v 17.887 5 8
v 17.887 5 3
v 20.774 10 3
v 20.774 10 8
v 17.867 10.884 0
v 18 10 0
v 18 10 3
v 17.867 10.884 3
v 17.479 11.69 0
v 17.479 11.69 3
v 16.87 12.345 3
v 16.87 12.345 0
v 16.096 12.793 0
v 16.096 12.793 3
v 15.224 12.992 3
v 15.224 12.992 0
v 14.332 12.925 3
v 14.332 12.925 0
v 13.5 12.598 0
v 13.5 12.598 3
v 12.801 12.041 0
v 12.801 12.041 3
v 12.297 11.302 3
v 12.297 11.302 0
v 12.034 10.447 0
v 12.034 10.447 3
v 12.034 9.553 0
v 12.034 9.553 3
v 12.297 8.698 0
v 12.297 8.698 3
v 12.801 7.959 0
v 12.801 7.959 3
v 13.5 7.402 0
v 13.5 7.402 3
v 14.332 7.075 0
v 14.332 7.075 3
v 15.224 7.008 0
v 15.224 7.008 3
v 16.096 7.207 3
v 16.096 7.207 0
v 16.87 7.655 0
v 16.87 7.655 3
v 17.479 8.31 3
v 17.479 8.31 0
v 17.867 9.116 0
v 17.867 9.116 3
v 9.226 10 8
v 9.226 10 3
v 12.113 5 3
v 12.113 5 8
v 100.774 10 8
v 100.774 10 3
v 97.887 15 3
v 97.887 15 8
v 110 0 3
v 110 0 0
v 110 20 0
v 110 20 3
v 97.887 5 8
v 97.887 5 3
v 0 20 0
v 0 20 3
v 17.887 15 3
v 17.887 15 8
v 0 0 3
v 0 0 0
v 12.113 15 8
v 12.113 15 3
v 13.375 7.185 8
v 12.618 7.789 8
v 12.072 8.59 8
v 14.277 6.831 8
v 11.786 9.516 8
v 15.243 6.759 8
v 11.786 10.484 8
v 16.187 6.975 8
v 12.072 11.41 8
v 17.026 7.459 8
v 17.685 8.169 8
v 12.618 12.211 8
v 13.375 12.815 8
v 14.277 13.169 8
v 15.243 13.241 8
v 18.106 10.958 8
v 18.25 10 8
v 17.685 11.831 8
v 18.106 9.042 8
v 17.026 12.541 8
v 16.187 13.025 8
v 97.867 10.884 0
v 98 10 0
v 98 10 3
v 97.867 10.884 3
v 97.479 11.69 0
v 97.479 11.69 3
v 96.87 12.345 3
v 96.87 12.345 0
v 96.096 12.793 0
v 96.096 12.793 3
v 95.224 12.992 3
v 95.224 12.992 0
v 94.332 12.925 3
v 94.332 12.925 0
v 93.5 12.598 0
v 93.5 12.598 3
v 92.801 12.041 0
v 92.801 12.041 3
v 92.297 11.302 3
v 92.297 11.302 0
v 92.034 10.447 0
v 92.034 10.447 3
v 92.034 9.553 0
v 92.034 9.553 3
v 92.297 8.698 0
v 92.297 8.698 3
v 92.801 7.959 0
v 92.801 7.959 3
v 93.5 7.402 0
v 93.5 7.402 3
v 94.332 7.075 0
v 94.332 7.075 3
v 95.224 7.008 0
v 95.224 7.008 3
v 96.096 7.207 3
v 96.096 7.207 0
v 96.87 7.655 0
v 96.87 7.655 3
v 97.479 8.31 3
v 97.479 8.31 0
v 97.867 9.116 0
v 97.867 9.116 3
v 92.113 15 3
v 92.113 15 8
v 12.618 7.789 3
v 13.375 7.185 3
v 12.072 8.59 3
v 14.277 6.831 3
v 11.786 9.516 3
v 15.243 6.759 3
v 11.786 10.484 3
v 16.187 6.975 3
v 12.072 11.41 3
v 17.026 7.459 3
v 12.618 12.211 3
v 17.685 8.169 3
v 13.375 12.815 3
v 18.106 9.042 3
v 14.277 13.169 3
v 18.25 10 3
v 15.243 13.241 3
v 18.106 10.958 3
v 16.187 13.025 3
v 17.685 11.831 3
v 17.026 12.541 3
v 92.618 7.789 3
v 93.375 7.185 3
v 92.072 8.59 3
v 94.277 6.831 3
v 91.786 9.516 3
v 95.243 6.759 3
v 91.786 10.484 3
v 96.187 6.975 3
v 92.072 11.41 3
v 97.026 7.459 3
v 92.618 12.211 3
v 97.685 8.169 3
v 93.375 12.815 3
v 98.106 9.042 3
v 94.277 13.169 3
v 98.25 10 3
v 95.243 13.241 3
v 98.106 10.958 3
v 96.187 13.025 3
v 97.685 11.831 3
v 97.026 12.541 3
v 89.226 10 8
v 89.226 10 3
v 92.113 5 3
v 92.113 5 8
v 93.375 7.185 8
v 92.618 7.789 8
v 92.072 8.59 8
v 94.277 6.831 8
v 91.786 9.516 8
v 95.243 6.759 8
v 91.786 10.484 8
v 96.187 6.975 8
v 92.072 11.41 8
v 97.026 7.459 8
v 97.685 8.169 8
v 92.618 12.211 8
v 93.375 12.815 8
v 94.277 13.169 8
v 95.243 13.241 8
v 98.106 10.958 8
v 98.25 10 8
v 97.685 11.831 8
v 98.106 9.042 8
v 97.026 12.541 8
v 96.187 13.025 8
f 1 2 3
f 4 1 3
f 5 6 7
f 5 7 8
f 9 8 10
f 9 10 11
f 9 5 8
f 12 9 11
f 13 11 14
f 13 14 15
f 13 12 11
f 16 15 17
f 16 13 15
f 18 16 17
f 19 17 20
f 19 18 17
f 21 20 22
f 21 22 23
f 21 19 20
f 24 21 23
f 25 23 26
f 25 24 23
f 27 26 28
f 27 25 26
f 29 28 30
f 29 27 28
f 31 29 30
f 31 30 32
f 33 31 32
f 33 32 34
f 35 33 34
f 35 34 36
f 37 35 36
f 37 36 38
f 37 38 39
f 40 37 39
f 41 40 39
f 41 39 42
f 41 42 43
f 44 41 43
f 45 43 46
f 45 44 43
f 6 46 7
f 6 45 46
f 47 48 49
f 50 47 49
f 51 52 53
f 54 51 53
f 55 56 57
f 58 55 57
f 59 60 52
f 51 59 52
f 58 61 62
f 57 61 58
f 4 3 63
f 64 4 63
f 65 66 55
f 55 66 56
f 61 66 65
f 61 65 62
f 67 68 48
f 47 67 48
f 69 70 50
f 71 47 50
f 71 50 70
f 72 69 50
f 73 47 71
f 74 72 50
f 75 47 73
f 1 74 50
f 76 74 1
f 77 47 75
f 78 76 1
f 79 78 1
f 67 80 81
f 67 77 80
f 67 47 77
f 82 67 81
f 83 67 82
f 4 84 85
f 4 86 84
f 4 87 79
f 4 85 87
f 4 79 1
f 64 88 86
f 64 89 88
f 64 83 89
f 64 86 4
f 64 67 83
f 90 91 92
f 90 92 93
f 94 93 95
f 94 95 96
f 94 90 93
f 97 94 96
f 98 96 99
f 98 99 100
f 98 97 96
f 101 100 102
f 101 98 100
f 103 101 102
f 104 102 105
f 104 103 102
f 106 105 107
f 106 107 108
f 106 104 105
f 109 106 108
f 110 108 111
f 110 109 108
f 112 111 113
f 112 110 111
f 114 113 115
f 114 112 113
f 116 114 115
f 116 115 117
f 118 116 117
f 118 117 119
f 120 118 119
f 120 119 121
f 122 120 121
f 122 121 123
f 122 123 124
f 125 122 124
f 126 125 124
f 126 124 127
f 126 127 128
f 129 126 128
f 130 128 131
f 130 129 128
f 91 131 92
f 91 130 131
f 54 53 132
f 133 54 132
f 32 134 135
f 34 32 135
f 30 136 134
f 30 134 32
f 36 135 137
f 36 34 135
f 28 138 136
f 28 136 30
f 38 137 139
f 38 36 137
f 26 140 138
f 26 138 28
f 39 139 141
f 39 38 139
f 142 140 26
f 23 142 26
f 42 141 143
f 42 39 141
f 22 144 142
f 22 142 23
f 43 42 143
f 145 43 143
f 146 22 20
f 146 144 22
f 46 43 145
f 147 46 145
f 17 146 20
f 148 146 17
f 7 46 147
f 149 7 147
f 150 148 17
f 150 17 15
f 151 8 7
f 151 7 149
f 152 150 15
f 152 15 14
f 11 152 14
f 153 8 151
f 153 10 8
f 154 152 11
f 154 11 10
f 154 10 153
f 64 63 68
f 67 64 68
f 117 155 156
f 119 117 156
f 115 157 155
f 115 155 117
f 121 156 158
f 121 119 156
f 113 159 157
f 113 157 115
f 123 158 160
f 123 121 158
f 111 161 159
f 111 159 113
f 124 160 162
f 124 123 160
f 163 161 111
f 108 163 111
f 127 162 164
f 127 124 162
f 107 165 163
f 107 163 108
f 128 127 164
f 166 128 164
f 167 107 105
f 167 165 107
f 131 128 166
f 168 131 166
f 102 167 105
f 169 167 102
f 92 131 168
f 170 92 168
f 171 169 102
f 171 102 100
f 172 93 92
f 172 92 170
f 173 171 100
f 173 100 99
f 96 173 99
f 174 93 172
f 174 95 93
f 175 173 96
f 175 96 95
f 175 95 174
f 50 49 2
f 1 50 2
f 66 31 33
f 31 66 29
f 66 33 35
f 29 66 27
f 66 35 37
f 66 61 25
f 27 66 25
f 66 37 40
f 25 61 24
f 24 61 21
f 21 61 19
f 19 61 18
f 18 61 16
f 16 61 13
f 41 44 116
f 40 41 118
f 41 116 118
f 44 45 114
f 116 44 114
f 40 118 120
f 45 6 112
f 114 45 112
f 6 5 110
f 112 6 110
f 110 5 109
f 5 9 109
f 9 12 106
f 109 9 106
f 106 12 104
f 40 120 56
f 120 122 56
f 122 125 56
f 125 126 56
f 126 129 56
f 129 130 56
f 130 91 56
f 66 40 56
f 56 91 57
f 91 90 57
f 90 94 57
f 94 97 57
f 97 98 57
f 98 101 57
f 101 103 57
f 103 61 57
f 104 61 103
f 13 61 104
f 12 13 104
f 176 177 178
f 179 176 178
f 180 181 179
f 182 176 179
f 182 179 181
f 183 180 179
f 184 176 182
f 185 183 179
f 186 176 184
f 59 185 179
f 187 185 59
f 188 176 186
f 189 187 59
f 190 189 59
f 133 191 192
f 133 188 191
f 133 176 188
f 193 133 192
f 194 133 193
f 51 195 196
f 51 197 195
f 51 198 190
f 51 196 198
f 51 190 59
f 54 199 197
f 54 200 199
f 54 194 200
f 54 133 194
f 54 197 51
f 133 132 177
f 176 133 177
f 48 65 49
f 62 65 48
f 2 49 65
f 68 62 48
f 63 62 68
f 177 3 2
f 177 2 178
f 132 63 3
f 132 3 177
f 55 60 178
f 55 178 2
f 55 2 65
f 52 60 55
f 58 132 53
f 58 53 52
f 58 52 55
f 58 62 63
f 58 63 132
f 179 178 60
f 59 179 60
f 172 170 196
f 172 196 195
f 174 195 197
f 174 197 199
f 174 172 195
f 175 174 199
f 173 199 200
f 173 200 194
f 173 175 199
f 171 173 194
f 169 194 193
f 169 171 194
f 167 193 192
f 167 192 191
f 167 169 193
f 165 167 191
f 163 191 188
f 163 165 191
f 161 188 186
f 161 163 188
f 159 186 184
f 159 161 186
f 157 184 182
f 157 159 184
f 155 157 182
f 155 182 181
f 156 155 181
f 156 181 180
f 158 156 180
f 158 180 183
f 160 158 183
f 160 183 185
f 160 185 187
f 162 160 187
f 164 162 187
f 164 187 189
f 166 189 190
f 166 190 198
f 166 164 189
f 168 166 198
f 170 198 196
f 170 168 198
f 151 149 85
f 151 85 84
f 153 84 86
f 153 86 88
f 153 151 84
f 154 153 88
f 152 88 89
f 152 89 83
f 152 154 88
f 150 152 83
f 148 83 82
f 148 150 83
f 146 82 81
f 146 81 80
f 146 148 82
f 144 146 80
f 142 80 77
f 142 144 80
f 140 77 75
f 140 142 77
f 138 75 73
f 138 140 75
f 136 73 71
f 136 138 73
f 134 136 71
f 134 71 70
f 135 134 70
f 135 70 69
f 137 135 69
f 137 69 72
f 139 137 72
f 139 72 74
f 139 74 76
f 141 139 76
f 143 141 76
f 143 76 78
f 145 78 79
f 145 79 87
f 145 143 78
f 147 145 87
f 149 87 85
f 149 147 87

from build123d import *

# Parameters (mm, degrees)
F0_W     = 110
F0_H     = 20
F0_R     = 3
F1_DEPTH = 3
F2_R     = 3.25
F3_DEPTH = 5


with BuildPart() as f1:
    # F0 (on Top) → F1 (new body)
    with BuildSketch(Plane.XY):
        with Locations((55, 10)):
            Rectangle(F0_W, F0_H)
        with Locations((15, 10)):
            Circle(F0_R, mode=Mode.SUBTRACT)
        with Locations((95, 10)):
            Circle(F0_R, mode=Mode.SUBTRACT)
    extrude(amount=F1_DEPTH)

    # F2 (on face) → F3 (join)
    with BuildSketch(Plane.XY.offset(3)):
        Polygon((17.886751, 5), (20.773503, 10), (17.886751, 15), (12.113249, 15), (9.226497, 10), (12.113249, 5), align=None)
        with Locations((15, 10)):
            Circle(F2_R, mode=Mode.SUBTRACT)
        Polygon((97.886751, 5), (100.773503, 10), (97.886751, 15), (92.113249, 15), (89.226497, 10), (92.113249, 5), align=None)
        with Locations((95, 10)):
            Circle(F2_R, mode=Mode.SUBTRACT)
    extrude(amount=F3_DEPTH)


solid = f1.part
